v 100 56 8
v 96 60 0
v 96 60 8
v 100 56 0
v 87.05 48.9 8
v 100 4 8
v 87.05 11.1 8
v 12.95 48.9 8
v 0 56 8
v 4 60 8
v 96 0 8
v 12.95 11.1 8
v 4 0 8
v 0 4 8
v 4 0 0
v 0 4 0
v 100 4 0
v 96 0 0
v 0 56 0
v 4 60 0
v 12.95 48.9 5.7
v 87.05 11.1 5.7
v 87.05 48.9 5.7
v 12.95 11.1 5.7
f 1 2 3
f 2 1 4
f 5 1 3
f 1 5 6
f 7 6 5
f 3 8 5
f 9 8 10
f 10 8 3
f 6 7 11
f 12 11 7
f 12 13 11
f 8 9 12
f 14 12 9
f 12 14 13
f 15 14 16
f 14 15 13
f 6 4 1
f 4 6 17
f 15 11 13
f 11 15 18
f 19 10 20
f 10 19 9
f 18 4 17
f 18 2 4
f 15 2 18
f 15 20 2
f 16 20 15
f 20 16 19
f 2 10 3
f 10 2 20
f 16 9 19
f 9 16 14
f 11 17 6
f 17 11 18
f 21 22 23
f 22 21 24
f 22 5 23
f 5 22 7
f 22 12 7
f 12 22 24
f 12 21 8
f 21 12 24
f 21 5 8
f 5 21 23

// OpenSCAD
$fn = 32;

// ----------------------------------------------------------------------
// Windowed plate: 1 voids, 100 x 60 x 8 mm
// ----------------------------------------------------------------------

// --- parameters (mm) ---
plate_l = 100;            // plate length, X
plate_w = 60;             // plate width, Y
plate_t = 8;              // plate thickness, Z
edge_margin = 8;          // wall from the plate edge to any window
win1_l = 74.1;            // window length
win1_w = 37.8;            // window width
depth_1 = 2.3;            // depth of void 1 (full thickness = through)
corner_c = 4;             // corner chamfer of the plate

profile = [[4, 0], [96, 0], [100, 4], [100, 56], [96, 60], [4, 60], [0, 56], [0, 4]];  // primary outline, 8 points, counter clockwise
void_1 = [[12.95, 11.1], [87.05, 11.1], [87.05, 48.9], [12.95, 48.9]];  // large central window, 4 points

// --- the one profile operation ---
difference() {
  linear_extrude(height = plate_t) polygon(points = profile);
  translate([0, 0, plate_t - depth_1])
    linear_extrude(height = depth_1 + 1) polygon(points = void_1);
}
